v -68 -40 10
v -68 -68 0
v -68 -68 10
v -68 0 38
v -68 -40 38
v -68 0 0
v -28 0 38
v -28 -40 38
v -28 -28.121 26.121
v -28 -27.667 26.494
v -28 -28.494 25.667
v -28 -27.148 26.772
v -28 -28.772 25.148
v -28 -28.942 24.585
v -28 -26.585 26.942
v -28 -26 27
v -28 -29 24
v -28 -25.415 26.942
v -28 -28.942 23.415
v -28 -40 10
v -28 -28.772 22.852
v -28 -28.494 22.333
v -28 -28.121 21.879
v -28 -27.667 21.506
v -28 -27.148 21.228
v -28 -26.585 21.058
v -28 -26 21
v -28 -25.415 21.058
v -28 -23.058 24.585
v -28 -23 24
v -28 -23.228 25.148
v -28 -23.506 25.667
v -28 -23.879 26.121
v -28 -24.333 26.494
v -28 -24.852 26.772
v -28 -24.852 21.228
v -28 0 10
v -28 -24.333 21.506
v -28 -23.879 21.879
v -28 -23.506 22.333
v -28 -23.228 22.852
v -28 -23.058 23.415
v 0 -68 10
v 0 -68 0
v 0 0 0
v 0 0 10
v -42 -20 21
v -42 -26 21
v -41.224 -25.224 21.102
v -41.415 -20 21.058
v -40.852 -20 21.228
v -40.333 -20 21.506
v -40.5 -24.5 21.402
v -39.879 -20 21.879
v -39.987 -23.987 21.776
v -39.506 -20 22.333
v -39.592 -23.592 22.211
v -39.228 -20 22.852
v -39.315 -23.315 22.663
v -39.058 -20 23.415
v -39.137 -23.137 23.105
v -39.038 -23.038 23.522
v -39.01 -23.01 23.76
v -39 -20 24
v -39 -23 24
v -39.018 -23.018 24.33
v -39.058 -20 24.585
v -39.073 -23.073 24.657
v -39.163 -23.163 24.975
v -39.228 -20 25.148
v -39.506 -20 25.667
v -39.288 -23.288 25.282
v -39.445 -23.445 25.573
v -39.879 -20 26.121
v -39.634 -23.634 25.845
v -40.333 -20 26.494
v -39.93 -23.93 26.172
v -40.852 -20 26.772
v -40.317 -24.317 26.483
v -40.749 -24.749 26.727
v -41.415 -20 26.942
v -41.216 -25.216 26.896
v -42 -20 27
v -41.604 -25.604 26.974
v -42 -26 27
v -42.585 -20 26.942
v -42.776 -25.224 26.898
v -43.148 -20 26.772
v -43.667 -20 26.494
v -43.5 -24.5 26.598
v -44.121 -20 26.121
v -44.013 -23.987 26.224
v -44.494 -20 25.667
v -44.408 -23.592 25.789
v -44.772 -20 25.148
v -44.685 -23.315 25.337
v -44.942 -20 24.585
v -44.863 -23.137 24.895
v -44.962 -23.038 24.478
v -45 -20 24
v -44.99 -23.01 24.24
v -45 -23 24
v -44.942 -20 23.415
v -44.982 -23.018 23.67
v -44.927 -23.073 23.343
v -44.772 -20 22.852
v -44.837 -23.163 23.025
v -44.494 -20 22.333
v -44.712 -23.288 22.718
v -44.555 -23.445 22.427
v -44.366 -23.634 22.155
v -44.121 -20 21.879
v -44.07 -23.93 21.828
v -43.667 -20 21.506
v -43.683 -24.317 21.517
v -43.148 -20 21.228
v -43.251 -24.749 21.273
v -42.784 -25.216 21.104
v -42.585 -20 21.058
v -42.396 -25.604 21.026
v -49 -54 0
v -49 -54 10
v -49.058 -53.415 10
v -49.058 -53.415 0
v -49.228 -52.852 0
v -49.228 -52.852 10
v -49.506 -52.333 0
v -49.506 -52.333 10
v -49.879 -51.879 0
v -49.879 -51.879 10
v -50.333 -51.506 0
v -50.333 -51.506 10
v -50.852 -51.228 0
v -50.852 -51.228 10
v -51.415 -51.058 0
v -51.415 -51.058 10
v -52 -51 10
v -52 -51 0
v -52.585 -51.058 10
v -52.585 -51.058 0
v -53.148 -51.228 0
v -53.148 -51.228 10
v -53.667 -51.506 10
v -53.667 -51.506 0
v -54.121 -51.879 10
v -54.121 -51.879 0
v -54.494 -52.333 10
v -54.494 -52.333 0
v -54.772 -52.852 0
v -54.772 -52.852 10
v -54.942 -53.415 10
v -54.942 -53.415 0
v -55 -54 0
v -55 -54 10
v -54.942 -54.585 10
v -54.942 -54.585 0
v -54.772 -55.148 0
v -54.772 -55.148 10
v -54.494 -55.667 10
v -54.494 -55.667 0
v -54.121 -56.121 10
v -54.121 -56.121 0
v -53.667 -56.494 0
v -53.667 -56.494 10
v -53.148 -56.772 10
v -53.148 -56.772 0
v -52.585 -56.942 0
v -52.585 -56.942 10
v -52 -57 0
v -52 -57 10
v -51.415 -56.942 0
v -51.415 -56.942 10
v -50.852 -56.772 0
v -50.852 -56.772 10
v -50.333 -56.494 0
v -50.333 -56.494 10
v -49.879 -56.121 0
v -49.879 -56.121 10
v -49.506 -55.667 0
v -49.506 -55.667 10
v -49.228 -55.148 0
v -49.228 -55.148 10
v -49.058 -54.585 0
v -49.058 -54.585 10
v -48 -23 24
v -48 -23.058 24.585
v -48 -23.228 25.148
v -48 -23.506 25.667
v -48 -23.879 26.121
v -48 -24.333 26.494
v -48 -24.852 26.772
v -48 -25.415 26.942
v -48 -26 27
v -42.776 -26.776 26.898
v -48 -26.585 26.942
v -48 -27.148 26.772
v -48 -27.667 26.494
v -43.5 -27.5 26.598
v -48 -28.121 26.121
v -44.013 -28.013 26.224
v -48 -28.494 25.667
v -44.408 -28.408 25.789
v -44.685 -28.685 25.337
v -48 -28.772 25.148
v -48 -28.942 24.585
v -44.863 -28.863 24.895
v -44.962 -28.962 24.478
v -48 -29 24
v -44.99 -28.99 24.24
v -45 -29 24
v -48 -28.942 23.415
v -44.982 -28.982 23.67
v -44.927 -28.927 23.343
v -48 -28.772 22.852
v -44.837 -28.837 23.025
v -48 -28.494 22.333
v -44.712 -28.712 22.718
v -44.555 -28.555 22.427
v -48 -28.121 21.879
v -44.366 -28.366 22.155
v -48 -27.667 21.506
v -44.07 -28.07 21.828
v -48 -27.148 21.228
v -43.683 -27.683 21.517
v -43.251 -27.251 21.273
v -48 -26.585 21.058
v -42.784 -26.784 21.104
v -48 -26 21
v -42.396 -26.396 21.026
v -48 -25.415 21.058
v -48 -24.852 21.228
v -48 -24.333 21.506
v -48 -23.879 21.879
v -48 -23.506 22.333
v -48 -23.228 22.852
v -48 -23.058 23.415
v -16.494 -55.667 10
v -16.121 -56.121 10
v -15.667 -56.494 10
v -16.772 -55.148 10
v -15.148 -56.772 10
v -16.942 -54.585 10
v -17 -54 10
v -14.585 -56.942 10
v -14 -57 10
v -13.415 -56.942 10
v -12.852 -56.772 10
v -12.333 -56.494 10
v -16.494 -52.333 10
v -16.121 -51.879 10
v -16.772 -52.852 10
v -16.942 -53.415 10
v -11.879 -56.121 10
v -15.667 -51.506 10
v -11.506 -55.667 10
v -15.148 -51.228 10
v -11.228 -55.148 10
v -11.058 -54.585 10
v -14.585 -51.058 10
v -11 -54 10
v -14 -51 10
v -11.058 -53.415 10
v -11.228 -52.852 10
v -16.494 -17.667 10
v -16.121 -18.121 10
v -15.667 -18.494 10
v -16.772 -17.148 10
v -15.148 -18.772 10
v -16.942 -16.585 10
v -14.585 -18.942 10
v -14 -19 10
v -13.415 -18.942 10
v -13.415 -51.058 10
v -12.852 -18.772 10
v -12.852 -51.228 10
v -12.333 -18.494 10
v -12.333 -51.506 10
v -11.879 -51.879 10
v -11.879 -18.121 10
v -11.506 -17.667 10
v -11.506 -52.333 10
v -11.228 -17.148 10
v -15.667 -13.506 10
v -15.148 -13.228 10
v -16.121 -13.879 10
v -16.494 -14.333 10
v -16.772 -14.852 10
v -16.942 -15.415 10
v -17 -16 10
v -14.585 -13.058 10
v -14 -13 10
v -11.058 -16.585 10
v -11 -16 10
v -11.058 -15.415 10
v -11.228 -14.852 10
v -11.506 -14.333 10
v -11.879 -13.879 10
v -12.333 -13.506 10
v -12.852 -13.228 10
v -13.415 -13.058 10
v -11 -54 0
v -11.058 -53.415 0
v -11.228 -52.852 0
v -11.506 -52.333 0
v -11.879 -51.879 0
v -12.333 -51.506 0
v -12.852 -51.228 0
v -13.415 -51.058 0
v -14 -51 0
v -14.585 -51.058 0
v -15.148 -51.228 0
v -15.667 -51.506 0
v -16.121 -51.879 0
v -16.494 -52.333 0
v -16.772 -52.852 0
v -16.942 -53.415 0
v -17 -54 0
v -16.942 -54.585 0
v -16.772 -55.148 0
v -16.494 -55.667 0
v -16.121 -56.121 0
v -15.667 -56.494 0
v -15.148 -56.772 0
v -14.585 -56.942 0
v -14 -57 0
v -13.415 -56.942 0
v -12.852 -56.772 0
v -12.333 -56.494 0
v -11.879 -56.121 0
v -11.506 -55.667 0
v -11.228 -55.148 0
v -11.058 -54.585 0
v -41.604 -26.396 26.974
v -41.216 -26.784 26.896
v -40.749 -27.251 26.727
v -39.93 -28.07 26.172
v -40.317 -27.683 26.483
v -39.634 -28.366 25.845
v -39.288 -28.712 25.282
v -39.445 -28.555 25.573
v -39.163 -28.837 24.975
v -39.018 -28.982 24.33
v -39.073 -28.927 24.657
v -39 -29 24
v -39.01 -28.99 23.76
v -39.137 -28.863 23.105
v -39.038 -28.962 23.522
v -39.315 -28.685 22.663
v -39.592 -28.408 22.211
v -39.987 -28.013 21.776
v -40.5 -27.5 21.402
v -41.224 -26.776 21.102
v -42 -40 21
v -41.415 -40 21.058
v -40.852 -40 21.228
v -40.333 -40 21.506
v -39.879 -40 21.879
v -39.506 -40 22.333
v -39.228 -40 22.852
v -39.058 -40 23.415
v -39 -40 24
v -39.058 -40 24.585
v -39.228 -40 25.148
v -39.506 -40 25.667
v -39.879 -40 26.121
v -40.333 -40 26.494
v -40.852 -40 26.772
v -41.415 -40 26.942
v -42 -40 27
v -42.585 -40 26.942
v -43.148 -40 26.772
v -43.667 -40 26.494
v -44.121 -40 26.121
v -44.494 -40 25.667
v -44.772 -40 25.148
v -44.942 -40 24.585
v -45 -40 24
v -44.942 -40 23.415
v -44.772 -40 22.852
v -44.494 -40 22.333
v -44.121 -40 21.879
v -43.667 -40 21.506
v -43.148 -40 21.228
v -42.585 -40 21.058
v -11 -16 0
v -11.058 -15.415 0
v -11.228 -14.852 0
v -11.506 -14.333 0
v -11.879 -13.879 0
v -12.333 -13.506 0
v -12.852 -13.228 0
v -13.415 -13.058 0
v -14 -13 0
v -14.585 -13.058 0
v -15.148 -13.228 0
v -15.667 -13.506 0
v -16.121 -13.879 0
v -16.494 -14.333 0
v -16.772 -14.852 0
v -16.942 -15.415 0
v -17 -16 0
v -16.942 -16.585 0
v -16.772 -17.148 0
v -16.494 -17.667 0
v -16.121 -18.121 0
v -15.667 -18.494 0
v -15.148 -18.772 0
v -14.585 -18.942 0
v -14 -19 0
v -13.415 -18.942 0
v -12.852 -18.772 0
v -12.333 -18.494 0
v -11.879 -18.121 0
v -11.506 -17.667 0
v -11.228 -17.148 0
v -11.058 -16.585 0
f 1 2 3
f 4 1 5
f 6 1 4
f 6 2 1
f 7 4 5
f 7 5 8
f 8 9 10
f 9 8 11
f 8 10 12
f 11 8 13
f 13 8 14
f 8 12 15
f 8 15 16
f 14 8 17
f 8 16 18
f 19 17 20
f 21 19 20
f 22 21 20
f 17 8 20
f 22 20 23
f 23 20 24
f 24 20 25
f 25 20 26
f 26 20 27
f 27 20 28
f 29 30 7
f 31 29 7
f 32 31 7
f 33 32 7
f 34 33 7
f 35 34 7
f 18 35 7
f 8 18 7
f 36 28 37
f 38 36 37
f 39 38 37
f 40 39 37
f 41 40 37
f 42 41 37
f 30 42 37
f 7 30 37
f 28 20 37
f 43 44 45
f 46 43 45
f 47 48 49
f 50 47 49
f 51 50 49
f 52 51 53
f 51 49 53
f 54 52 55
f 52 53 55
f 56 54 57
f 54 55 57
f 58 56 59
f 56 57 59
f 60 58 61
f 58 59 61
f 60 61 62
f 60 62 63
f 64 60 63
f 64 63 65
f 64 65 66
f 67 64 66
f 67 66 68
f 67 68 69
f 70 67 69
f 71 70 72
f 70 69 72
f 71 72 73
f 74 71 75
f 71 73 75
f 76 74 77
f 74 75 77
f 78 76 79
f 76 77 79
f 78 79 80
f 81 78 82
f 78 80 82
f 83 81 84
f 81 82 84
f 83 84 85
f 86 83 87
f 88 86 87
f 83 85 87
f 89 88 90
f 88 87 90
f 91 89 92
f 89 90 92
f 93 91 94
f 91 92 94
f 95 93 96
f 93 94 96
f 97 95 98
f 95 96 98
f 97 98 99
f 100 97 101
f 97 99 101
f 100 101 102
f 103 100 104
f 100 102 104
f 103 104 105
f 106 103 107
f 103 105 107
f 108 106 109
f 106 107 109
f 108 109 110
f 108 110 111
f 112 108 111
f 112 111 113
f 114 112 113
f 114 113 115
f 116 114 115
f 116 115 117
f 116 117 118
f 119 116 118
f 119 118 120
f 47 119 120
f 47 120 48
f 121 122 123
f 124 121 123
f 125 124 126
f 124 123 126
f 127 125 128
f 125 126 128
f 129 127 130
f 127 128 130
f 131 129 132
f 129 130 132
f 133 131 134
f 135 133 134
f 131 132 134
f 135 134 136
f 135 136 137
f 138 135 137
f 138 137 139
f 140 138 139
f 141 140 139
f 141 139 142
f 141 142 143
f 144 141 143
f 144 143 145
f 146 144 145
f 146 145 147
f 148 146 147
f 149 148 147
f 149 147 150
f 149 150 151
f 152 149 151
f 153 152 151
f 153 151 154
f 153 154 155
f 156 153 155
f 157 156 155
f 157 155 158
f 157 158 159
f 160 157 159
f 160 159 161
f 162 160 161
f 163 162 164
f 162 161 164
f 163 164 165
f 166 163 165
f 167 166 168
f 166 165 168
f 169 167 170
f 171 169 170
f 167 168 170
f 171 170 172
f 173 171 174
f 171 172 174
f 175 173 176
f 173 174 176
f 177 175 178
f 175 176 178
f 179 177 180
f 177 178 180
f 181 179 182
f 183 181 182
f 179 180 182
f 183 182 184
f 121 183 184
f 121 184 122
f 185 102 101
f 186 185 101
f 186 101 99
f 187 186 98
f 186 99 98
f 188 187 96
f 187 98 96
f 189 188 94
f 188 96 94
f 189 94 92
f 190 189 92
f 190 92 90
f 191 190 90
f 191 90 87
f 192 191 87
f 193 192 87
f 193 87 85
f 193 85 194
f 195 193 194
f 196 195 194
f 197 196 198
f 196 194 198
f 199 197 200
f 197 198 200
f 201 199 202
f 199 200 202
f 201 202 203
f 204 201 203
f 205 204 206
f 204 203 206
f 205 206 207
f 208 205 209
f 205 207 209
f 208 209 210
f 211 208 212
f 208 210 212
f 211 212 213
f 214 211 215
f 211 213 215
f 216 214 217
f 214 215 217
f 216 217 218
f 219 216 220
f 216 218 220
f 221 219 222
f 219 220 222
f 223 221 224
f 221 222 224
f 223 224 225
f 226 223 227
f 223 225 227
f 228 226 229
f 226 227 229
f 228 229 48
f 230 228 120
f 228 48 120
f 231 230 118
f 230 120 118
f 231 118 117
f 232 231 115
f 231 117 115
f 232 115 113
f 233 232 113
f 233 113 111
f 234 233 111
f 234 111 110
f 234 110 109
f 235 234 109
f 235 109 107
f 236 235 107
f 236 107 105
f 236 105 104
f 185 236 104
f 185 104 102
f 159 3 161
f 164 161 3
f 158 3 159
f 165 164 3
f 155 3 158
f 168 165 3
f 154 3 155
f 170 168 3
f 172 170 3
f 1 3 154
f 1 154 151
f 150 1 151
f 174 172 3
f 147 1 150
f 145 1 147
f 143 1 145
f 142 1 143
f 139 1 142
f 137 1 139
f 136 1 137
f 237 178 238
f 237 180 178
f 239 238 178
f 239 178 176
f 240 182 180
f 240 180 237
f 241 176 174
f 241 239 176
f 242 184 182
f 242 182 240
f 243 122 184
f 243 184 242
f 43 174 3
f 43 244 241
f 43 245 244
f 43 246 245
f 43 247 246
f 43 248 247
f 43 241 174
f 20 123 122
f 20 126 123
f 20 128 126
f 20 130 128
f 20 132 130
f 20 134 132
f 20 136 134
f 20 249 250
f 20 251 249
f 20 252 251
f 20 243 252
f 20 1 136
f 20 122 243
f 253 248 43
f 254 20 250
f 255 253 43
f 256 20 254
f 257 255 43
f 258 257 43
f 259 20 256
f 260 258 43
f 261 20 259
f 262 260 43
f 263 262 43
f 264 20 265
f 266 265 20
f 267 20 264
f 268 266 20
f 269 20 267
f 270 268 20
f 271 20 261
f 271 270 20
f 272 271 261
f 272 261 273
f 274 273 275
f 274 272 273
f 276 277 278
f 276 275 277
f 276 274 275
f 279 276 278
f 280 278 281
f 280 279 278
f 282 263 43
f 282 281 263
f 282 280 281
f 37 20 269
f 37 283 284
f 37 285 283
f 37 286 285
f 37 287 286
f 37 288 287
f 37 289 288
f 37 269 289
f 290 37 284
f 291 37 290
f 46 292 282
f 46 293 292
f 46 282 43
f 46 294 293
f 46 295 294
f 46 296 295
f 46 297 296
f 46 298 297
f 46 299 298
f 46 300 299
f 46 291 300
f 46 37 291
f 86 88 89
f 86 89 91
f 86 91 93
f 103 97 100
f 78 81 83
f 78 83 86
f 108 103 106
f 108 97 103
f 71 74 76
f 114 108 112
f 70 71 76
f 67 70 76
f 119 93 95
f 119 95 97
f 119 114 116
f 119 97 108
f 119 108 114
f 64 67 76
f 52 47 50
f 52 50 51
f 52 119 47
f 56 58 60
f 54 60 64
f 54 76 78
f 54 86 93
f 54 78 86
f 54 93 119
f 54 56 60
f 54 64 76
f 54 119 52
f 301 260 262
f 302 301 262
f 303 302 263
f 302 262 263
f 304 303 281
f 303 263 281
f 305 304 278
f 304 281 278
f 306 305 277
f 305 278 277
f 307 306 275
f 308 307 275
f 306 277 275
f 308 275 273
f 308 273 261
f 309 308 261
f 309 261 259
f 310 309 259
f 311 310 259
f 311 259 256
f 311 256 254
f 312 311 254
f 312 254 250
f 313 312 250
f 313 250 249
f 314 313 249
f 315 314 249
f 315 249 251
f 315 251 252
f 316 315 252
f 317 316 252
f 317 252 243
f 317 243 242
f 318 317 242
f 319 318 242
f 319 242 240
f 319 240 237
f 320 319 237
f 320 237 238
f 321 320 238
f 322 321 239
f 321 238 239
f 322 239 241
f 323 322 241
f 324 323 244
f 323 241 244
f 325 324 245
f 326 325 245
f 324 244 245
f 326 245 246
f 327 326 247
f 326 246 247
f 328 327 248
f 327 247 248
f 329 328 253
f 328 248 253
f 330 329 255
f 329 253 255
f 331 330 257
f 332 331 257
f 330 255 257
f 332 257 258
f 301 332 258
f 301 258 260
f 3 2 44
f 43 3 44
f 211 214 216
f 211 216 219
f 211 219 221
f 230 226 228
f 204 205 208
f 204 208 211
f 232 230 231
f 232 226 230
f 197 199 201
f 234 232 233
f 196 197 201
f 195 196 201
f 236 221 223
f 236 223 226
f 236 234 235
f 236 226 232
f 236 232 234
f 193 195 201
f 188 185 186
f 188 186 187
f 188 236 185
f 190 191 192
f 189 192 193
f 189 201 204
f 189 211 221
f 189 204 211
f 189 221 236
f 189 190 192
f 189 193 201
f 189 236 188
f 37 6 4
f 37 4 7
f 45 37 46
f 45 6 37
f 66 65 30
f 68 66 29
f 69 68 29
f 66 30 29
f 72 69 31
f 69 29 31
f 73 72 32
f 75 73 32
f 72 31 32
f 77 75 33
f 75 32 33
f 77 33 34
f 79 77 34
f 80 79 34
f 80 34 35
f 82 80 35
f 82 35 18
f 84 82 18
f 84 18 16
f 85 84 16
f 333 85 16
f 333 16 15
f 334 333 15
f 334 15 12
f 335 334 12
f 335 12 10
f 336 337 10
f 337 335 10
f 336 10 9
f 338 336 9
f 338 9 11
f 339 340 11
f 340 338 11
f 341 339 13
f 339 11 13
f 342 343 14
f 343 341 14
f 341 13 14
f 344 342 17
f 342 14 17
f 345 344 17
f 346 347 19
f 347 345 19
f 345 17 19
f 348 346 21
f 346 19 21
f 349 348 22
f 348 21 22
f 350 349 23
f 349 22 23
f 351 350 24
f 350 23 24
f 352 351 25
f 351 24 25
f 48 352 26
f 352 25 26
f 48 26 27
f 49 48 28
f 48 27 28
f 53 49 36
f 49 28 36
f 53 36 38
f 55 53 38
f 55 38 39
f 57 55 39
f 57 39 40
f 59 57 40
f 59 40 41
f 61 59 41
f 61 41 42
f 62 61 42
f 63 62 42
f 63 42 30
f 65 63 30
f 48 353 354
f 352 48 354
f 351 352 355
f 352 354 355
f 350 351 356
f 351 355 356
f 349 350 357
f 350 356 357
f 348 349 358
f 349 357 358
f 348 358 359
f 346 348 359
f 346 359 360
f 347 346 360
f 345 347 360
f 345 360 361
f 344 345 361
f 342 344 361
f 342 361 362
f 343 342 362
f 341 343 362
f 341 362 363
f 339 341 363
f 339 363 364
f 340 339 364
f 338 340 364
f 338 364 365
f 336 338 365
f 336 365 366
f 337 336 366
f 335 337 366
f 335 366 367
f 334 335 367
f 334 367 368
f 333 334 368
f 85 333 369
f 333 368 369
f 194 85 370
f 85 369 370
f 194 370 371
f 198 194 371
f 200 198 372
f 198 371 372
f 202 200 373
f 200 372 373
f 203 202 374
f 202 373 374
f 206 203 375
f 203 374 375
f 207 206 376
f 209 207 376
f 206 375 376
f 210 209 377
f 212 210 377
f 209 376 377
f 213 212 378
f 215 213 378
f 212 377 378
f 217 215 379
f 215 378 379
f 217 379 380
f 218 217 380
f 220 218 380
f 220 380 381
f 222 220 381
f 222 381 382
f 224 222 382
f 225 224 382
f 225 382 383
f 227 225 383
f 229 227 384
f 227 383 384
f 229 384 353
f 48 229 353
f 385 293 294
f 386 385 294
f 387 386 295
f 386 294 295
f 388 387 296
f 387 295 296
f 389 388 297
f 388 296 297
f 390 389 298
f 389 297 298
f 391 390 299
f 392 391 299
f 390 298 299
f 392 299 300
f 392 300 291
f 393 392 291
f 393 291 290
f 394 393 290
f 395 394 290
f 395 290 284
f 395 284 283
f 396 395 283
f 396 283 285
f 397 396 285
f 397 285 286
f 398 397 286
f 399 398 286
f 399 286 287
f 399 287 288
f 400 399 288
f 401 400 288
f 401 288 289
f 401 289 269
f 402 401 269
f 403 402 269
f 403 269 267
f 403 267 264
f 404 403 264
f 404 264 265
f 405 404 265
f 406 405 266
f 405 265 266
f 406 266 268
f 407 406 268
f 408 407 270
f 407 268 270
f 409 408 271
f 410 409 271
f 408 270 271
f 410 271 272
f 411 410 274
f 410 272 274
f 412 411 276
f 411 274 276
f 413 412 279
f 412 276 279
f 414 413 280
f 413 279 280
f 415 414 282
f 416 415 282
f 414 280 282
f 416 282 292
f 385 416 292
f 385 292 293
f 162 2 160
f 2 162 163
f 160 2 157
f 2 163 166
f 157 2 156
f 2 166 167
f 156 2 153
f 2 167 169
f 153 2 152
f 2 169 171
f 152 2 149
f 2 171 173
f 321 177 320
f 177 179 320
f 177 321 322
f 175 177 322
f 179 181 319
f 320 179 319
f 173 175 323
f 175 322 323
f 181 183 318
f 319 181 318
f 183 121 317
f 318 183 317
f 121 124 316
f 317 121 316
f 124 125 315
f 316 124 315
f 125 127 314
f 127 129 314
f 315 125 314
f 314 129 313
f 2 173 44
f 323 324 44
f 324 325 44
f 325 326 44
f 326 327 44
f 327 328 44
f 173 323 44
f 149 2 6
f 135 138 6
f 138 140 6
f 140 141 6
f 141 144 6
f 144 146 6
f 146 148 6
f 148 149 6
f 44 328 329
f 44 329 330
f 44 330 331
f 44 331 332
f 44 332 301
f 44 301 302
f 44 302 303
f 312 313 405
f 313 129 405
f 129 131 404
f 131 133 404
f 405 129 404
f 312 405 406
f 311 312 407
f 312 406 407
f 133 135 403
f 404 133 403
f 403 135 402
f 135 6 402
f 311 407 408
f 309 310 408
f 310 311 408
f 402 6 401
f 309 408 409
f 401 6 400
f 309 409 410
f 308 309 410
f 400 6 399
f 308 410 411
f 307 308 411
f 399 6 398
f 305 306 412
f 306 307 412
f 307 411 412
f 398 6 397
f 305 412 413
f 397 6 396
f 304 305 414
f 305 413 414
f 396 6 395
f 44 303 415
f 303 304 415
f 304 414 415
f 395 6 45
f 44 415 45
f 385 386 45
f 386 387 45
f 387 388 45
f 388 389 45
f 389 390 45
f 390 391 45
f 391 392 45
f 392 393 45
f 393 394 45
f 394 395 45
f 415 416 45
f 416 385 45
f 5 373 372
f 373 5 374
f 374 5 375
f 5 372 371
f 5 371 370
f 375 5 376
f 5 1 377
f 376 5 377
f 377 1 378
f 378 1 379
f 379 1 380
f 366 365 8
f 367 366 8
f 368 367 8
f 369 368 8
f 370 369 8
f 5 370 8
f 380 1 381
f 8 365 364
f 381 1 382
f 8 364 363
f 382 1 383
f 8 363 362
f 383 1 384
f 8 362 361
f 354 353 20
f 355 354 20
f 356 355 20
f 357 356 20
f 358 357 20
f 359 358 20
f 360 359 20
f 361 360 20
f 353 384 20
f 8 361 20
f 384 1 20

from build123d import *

# Parameters (mm, degrees)
IZIM1_W                     = 68
IZIM1_H                     = 68
Y_KSEKLIK_EKSTR_ZYON1_DEPTH = 10
IZIM2_W                     = 40
IZIM2_H                     = 40
Y_KSEKLIK_EKSTR_ZYON2_DEPTH = 28
IZIM3_R                     = 3
KES_EKSTR_ZYON1_DEPTH       = 20
IZIM4_R                     = 3
KES_EKSTR_ZYON2_DEPTH       = 20
IZIM5_R                     = 3
KES_EKSTR_ZYON3_DEPTH       = 101.159872204


with BuildPart() as part:
    # Çizim1 → Yükseklik-Ekstrüzyon1 (new body)
    with BuildSketch(Plane.XY):
        with Locations((-34, -34)):
            Rectangle(IZIM1_W, IZIM1_H)
    extrude(amount=Y_KSEKLIK_EKSTR_ZYON1_DEPTH)

    # Çizim2 → Yükseklik-Ekstrüzyon2 (add)
    with BuildSketch(Plane.XY.offset(10)):
        with Locations((-48, -20)):
            Rectangle(IZIM2_W, IZIM2_H)
    extrude(amount=Y_KSEKLIK_EKSTR_ZYON2_DEPTH)

    # Çizim3 → Kes-Ekstrüzyon1 (cut)
    with BuildSketch(Plane.XZ.offset(40)):
        with Locations(Location((-42, 24, 0), (0, 0, 270))):
            Circle(IZIM3_R)
    extrude(amount=-KES_EKSTR_ZYON1_DEPTH, mode=Mode.SUBTRACT)

    # Çizim4 → Kes-Ekstrüzyon2 (cut)
    with BuildSketch(Plane(origin=(-28, 0, 0), x_dir=(0, 0, -1), z_dir=(1, 0, 0))):
        with Locations(Location((-24, -26, 0), (0, 0, 90))):
            Circle(IZIM4_R)
    extrude(amount=-KES_EKSTR_ZYON2_DEPTH, mode=Mode.SUBTRACT)

    # Çizim5 → Kes-Ekstrüzyon3 (cut, through all)
    with BuildSketch(Plane.XY.offset(10)):
        with Locations((-14, -54)):
            Circle(IZIM5_R)
        with Locations((-14, -16)):
            Circle(IZIM5_R)
        with Locations((-52, -54)):
            Circle(IZIM5_R)
    extrude(amount=-KES_EKSTR_ZYON3_DEPTH, mode=Mode.SUBTRACT)


solid = part.part
